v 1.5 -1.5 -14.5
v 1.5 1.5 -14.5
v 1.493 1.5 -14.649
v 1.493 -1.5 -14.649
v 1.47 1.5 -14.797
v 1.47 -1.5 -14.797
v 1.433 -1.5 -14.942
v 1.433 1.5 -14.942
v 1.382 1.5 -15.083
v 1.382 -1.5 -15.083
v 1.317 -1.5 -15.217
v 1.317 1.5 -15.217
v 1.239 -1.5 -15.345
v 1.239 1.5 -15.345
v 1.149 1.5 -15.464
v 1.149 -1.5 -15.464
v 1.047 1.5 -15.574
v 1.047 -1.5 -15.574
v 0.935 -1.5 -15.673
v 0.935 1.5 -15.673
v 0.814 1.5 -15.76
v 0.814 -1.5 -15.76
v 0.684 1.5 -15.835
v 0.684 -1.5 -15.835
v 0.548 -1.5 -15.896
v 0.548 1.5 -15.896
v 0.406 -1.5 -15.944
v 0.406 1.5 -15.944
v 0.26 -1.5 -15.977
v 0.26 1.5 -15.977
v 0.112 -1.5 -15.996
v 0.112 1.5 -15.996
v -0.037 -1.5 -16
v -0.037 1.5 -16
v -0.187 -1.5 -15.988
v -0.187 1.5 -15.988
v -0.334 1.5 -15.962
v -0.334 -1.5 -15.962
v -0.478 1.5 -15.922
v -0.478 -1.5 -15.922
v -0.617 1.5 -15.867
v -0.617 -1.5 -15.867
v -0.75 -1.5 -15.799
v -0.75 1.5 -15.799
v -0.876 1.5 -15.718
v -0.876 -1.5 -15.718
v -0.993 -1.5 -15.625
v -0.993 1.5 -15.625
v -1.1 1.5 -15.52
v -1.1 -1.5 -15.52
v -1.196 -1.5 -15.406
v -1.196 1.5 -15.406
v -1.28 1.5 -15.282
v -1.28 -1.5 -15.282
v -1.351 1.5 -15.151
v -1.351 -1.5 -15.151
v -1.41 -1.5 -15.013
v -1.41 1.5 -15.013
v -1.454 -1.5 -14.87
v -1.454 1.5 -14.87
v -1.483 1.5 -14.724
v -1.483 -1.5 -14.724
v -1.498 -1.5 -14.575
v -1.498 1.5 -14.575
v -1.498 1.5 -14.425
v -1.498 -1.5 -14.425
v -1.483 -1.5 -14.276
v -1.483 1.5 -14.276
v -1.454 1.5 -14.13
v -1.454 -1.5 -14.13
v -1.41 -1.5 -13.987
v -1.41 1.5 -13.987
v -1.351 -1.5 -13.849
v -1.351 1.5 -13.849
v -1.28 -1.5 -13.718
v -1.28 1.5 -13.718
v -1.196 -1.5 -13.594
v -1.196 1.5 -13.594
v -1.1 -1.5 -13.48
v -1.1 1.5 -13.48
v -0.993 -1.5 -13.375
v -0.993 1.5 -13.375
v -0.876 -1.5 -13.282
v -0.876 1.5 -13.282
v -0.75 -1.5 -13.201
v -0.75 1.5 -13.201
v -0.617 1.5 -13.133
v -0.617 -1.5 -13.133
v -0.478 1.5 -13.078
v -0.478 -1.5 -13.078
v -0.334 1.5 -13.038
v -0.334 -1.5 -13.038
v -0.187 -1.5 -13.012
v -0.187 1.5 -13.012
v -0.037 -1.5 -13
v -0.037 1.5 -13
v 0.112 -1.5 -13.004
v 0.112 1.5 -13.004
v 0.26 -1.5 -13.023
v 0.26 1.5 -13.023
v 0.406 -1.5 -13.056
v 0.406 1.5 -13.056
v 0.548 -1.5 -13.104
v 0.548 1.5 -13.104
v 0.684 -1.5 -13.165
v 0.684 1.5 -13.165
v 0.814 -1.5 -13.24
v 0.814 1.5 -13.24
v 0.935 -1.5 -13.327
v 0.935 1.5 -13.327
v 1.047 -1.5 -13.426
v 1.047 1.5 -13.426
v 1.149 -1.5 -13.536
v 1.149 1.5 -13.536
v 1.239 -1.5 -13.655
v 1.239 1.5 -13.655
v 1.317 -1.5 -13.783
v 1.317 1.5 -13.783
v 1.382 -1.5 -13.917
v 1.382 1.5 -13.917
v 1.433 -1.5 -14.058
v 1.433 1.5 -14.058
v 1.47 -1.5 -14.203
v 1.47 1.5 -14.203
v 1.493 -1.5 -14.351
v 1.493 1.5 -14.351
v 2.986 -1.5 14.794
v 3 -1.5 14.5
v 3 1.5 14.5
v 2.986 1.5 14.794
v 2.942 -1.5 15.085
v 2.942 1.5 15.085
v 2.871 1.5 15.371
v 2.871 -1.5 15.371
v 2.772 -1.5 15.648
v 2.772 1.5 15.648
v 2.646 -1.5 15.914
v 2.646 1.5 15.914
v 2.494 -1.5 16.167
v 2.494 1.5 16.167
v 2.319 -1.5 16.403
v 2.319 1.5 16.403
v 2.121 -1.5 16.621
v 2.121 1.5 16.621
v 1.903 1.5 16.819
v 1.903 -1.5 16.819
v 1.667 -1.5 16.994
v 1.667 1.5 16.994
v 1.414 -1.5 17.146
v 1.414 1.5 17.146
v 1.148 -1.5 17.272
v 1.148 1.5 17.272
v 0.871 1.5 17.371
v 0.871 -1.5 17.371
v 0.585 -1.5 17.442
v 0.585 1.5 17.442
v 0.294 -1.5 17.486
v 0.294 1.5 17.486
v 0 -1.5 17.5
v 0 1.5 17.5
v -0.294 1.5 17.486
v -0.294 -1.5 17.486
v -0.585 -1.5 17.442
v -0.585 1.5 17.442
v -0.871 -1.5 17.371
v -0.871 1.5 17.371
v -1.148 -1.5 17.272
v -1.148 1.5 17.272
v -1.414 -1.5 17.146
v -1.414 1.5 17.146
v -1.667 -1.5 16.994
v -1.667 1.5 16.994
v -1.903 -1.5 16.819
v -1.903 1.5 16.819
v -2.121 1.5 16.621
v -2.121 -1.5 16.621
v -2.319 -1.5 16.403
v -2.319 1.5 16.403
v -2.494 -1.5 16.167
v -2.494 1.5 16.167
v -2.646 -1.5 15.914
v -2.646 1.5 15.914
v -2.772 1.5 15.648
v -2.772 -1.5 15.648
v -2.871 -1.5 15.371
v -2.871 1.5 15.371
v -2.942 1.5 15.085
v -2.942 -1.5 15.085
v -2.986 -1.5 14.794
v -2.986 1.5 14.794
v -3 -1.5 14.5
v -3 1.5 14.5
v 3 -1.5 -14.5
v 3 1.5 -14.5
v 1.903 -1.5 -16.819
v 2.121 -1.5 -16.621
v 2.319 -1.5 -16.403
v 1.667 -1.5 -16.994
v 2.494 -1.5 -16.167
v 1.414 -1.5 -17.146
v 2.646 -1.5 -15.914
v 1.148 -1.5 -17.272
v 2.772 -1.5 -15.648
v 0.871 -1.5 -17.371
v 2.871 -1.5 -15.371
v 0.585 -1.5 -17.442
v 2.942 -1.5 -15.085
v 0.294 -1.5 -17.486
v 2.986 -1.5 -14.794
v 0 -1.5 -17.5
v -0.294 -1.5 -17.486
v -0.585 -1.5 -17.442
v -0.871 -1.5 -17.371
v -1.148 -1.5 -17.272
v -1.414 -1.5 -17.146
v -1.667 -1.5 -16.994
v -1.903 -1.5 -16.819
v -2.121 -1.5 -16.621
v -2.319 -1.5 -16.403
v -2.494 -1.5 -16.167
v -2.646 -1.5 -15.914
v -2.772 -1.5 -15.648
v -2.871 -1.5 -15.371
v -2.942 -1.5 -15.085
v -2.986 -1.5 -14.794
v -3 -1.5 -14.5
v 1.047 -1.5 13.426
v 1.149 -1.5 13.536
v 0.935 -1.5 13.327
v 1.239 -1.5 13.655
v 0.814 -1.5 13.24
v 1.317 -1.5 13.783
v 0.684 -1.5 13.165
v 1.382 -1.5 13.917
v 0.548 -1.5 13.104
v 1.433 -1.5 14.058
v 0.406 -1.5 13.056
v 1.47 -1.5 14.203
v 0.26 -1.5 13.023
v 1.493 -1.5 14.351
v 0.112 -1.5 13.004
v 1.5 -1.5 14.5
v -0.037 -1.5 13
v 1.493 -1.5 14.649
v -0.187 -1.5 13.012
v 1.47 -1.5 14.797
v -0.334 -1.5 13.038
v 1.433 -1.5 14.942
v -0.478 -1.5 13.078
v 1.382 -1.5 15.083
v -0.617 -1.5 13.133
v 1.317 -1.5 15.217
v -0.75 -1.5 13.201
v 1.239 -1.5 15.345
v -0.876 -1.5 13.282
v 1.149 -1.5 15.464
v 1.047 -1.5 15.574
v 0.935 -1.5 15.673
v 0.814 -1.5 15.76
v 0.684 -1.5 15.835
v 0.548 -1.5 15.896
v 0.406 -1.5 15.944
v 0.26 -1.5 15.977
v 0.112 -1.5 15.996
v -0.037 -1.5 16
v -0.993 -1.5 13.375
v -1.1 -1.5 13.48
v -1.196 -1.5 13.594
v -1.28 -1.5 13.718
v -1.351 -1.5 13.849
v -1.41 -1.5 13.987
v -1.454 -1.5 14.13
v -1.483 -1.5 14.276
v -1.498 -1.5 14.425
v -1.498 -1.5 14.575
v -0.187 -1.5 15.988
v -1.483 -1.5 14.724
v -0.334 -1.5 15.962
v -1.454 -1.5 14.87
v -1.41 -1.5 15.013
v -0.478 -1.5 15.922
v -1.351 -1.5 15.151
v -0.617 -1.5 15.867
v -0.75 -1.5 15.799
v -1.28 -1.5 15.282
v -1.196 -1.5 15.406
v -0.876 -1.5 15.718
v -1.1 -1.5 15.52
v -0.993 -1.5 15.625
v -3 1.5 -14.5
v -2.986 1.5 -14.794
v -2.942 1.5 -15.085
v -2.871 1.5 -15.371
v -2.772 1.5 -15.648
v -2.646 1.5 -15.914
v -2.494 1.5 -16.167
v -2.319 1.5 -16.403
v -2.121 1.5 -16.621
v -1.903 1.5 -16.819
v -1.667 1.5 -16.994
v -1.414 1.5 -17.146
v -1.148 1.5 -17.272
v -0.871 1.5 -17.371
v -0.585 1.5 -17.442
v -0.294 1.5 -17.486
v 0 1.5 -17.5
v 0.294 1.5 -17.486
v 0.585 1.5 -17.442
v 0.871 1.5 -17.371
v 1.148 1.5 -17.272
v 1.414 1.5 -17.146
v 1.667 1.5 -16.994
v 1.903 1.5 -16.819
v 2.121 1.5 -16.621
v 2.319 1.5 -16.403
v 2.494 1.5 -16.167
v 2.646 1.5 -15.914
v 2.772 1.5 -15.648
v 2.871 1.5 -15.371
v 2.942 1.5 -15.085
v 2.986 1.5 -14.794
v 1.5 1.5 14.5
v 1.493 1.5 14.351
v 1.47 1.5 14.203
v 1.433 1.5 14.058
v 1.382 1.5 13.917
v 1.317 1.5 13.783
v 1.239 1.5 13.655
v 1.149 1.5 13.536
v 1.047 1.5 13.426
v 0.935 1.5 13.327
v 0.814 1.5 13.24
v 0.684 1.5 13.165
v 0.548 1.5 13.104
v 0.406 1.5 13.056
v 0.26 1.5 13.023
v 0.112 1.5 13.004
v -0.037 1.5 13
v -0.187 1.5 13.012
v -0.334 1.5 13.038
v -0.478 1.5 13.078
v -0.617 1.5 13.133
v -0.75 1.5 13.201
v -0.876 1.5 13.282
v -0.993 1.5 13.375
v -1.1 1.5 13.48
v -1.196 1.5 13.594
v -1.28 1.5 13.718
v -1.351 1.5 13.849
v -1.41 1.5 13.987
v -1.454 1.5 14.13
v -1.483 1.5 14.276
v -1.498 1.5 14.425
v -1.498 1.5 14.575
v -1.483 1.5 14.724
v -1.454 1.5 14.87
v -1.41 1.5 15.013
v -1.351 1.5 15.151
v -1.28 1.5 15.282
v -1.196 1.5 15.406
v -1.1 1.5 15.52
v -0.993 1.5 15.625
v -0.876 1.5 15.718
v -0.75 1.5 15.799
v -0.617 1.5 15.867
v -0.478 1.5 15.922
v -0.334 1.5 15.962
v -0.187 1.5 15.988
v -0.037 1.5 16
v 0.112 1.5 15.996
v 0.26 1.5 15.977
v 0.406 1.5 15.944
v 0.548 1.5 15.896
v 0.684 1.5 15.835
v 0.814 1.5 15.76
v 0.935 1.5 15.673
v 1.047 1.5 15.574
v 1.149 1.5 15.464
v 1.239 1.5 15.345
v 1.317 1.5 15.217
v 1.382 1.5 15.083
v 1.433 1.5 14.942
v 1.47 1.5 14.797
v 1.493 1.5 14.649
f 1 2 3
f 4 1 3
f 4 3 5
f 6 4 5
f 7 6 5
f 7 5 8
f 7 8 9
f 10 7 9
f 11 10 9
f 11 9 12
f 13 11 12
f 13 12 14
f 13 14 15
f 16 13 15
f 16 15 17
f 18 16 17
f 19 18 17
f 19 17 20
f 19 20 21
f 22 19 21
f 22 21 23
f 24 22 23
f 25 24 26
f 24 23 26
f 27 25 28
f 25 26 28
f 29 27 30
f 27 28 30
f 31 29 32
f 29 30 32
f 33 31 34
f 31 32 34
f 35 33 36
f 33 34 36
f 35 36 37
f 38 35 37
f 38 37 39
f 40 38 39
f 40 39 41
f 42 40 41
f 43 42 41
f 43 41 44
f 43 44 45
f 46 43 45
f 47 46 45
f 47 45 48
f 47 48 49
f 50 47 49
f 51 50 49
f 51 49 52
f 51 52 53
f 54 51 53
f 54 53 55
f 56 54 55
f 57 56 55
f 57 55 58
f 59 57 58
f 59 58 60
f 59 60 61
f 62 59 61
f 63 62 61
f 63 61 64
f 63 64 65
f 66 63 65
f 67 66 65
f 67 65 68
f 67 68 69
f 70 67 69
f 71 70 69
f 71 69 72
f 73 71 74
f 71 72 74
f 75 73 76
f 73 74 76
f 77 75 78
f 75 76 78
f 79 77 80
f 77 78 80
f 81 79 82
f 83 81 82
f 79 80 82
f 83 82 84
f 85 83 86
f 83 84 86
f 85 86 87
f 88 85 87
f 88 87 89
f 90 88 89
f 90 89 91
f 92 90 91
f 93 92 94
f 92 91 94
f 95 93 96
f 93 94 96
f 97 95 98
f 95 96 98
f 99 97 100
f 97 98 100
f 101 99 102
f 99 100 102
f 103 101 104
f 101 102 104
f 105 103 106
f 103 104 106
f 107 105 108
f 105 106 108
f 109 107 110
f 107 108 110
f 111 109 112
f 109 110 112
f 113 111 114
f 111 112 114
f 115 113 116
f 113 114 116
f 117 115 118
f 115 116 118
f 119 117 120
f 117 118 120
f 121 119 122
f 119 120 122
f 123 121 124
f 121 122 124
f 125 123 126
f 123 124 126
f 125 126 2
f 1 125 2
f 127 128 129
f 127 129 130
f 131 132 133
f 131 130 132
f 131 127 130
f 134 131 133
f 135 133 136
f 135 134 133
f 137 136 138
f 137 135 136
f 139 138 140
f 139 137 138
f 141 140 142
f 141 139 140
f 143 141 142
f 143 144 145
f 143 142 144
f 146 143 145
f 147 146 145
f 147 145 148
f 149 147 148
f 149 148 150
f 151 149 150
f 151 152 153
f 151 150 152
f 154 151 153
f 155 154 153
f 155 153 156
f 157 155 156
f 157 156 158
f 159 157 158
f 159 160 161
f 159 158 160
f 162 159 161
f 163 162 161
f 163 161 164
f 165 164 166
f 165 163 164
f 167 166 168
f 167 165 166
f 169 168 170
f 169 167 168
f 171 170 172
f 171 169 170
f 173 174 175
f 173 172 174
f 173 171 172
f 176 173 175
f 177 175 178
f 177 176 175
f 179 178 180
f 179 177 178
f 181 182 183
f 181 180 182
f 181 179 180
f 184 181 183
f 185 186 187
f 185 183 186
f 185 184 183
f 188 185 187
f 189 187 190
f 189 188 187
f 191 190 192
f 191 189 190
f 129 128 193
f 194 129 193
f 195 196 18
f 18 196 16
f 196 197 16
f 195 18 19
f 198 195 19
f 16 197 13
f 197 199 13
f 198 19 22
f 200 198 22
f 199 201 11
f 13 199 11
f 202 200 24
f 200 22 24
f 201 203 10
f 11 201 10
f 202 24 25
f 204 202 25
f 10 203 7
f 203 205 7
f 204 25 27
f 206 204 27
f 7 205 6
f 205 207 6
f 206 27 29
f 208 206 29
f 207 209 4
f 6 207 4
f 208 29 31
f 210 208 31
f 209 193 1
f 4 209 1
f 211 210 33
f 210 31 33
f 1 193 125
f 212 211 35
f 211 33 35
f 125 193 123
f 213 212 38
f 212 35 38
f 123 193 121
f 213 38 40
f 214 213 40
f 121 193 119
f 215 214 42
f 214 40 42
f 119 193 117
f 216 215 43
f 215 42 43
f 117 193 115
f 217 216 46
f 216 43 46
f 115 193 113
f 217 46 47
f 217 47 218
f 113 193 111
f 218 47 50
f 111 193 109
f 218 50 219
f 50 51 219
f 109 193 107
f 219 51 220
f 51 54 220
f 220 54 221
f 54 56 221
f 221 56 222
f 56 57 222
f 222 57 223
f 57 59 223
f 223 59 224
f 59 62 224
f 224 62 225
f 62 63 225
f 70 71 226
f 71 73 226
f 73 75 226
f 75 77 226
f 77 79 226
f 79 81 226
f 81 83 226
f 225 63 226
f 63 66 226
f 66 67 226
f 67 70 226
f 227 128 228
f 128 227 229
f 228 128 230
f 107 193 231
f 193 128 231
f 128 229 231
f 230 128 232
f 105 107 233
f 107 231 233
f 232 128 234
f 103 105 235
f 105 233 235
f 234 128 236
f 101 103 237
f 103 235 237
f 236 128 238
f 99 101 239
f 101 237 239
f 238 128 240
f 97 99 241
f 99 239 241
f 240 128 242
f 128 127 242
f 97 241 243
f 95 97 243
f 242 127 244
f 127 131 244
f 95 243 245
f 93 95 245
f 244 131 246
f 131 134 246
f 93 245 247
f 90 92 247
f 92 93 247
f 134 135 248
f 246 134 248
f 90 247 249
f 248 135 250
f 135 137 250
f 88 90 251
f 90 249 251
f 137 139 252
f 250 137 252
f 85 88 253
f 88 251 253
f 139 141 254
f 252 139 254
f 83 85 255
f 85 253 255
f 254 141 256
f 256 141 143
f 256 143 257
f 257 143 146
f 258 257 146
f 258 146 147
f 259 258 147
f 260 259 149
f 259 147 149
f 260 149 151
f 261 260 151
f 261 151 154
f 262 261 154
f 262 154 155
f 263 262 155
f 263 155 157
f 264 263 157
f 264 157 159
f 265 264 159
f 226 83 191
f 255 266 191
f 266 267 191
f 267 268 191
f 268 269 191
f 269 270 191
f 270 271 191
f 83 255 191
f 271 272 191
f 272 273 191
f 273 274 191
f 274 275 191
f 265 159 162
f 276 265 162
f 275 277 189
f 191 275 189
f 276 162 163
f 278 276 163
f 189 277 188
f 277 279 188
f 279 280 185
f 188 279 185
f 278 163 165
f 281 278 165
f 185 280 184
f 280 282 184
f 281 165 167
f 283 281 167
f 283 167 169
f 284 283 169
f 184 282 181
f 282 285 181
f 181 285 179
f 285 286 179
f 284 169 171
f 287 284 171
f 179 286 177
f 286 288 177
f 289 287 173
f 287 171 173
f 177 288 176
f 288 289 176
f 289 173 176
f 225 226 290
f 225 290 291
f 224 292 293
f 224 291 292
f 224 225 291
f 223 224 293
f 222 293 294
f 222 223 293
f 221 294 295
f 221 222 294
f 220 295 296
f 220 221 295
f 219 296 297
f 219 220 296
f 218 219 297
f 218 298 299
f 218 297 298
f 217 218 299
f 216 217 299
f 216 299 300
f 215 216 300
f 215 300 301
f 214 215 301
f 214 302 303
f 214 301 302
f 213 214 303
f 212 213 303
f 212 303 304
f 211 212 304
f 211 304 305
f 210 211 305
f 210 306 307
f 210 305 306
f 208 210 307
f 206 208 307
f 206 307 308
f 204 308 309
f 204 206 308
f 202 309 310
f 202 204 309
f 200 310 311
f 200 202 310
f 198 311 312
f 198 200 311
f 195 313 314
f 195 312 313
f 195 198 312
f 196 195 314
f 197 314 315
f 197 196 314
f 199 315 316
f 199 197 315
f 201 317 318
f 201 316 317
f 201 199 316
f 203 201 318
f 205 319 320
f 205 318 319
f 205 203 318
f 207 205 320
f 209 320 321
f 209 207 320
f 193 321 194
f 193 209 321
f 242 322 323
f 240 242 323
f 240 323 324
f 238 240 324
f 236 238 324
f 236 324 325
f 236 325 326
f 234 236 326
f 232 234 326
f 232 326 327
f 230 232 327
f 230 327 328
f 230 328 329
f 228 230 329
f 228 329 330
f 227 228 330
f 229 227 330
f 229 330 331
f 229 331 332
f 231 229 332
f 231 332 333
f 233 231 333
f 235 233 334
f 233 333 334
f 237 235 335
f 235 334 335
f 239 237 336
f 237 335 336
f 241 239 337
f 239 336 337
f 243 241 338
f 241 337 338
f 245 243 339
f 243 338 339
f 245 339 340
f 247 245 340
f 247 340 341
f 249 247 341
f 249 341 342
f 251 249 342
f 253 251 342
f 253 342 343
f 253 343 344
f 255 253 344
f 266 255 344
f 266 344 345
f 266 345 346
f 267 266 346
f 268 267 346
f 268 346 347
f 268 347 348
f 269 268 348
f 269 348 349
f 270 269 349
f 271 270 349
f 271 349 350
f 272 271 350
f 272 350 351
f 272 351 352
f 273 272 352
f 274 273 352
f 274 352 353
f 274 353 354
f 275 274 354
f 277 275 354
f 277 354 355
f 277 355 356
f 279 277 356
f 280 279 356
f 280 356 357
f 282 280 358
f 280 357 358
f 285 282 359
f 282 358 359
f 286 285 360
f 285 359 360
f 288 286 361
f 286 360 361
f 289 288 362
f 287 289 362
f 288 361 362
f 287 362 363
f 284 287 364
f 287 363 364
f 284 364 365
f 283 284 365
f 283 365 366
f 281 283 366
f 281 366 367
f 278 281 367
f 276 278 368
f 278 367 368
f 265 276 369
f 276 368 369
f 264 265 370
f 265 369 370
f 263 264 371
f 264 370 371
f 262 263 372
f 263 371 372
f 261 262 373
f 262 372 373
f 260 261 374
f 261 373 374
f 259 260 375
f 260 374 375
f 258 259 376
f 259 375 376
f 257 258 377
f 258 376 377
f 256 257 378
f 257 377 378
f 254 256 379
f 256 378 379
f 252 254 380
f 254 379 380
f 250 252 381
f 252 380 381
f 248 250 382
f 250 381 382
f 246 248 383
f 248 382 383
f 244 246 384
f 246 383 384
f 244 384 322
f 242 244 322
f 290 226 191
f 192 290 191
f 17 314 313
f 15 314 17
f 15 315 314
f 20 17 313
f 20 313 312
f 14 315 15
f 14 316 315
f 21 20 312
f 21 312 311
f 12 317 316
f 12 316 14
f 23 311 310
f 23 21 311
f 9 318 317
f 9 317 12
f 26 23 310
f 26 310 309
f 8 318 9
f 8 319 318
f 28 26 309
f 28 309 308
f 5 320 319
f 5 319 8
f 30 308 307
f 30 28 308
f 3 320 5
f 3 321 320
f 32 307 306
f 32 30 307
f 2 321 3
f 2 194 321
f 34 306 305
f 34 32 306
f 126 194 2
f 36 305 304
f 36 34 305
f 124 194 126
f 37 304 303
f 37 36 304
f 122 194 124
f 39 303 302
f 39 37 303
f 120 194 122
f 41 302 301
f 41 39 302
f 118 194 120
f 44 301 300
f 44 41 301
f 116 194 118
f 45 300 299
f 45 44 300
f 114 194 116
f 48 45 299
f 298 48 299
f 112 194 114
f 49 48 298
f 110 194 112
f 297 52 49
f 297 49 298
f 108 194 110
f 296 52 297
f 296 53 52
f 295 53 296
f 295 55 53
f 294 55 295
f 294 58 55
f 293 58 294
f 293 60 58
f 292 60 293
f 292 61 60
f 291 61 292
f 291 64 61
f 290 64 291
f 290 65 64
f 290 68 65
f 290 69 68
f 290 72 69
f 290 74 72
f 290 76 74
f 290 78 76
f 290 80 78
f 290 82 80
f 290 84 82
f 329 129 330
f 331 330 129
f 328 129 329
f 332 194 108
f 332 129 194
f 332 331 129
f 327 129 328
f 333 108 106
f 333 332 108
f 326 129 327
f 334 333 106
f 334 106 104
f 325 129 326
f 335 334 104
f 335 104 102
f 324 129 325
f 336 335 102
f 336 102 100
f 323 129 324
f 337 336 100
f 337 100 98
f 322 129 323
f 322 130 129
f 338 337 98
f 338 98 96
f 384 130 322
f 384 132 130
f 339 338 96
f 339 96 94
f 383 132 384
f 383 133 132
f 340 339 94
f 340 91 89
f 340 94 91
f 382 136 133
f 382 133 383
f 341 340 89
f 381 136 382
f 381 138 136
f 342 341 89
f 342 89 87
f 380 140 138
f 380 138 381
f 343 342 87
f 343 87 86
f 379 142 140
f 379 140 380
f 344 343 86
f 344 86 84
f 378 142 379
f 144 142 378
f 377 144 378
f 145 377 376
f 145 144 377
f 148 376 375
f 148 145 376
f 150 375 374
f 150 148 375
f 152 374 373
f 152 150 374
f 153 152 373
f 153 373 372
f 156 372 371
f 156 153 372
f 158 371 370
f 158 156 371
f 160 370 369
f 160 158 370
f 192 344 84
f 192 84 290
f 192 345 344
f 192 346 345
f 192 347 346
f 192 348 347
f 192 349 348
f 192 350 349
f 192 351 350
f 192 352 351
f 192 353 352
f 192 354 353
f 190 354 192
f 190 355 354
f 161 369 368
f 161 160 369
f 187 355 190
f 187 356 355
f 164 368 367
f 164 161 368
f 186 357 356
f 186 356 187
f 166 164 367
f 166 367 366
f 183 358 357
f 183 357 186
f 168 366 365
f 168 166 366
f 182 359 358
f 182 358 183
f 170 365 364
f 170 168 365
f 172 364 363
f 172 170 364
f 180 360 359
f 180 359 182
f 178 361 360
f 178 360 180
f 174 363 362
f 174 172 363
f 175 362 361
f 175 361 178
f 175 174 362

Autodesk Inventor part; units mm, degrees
ref_plane "YZ Plane" through (0, 0, 0) normal (1, 0, 0) x (0, 1, 0)
ref_plane "XZ Plane" through (0, 0, 0) normal (0, 1, 0) x (-1, 0, 0)
ref_plane "XY Plane" through (0, 0, 0) normal (0, 0, 1) x (1, 0, 0)
sketch "Boceto1" plane through (0, 0, 0) normal (0, 1, 0) x (-1, 0, 0)
  line L0 (0, -14.5) -> (0, 14.5) construction
  line L1 (3, -14.5) -> (3, 14.5)
  line L2 (-3, 14.5) -> (-3, -14.5)
  arc A0 (-3, -14.5) -> (3, -14.5) centre (0, -14.5) ccw
  arc A1 (3, 14.5) -> (-3, 14.5) centre (0, 14.5) ccw
  point P0 (0, 0)
  point P1 (0, 17.5)
  point P2 (0, -17.5)
  dimension "d0" = 14.5
  dimension "d1" = 6
extrude "Extrusión1" add sketch "Boceto1" along normal mid plane 3
sketch "Boceto2" plane through (0, 1.5, 0) normal (0, 1, 0) x (1, 0, 0)
  arc A0 (-3, -14.5) -> (3, -14.5) centre (0, -14.5) ccw construction
  arc A1 (3, 14.5) -> (-3, 14.5) centre (0, 14.5) ccw construction
  circle A2 centre (0, -14.5) radius 1.5
  circle A3 centre (0, 14.5) radius 1.5
  point P0 (0, 0)
  dimension "d4" = 3
  dimension "d5" = 3
extrude "Extrusión2" cut sketch "Boceto2" against normal blind 3
equation "\"Radio_pliegue\" = Grosor"
equation "\"Anchura_desahogo_plegado\" = Grosor"
equation "\"Profundidad_desahogo_plegado\" = 0.5 * Grosor"
equation "\"Tamaño_destalonado\" = 4 * Grosor"
equation "\"Remanente_mínimo\" = 2 * Grosor"
equation "\"Radiodetransición\" = Radio_pliegue"
equation "\"Tamaño_de_radio_de_Jacobi\" = Radio_pliegue"
equation "\"TamañoSeparación\" = Grosor"
equation "\"Grosor\" = 0.5"
properties part number "Pinza_pieza2"
